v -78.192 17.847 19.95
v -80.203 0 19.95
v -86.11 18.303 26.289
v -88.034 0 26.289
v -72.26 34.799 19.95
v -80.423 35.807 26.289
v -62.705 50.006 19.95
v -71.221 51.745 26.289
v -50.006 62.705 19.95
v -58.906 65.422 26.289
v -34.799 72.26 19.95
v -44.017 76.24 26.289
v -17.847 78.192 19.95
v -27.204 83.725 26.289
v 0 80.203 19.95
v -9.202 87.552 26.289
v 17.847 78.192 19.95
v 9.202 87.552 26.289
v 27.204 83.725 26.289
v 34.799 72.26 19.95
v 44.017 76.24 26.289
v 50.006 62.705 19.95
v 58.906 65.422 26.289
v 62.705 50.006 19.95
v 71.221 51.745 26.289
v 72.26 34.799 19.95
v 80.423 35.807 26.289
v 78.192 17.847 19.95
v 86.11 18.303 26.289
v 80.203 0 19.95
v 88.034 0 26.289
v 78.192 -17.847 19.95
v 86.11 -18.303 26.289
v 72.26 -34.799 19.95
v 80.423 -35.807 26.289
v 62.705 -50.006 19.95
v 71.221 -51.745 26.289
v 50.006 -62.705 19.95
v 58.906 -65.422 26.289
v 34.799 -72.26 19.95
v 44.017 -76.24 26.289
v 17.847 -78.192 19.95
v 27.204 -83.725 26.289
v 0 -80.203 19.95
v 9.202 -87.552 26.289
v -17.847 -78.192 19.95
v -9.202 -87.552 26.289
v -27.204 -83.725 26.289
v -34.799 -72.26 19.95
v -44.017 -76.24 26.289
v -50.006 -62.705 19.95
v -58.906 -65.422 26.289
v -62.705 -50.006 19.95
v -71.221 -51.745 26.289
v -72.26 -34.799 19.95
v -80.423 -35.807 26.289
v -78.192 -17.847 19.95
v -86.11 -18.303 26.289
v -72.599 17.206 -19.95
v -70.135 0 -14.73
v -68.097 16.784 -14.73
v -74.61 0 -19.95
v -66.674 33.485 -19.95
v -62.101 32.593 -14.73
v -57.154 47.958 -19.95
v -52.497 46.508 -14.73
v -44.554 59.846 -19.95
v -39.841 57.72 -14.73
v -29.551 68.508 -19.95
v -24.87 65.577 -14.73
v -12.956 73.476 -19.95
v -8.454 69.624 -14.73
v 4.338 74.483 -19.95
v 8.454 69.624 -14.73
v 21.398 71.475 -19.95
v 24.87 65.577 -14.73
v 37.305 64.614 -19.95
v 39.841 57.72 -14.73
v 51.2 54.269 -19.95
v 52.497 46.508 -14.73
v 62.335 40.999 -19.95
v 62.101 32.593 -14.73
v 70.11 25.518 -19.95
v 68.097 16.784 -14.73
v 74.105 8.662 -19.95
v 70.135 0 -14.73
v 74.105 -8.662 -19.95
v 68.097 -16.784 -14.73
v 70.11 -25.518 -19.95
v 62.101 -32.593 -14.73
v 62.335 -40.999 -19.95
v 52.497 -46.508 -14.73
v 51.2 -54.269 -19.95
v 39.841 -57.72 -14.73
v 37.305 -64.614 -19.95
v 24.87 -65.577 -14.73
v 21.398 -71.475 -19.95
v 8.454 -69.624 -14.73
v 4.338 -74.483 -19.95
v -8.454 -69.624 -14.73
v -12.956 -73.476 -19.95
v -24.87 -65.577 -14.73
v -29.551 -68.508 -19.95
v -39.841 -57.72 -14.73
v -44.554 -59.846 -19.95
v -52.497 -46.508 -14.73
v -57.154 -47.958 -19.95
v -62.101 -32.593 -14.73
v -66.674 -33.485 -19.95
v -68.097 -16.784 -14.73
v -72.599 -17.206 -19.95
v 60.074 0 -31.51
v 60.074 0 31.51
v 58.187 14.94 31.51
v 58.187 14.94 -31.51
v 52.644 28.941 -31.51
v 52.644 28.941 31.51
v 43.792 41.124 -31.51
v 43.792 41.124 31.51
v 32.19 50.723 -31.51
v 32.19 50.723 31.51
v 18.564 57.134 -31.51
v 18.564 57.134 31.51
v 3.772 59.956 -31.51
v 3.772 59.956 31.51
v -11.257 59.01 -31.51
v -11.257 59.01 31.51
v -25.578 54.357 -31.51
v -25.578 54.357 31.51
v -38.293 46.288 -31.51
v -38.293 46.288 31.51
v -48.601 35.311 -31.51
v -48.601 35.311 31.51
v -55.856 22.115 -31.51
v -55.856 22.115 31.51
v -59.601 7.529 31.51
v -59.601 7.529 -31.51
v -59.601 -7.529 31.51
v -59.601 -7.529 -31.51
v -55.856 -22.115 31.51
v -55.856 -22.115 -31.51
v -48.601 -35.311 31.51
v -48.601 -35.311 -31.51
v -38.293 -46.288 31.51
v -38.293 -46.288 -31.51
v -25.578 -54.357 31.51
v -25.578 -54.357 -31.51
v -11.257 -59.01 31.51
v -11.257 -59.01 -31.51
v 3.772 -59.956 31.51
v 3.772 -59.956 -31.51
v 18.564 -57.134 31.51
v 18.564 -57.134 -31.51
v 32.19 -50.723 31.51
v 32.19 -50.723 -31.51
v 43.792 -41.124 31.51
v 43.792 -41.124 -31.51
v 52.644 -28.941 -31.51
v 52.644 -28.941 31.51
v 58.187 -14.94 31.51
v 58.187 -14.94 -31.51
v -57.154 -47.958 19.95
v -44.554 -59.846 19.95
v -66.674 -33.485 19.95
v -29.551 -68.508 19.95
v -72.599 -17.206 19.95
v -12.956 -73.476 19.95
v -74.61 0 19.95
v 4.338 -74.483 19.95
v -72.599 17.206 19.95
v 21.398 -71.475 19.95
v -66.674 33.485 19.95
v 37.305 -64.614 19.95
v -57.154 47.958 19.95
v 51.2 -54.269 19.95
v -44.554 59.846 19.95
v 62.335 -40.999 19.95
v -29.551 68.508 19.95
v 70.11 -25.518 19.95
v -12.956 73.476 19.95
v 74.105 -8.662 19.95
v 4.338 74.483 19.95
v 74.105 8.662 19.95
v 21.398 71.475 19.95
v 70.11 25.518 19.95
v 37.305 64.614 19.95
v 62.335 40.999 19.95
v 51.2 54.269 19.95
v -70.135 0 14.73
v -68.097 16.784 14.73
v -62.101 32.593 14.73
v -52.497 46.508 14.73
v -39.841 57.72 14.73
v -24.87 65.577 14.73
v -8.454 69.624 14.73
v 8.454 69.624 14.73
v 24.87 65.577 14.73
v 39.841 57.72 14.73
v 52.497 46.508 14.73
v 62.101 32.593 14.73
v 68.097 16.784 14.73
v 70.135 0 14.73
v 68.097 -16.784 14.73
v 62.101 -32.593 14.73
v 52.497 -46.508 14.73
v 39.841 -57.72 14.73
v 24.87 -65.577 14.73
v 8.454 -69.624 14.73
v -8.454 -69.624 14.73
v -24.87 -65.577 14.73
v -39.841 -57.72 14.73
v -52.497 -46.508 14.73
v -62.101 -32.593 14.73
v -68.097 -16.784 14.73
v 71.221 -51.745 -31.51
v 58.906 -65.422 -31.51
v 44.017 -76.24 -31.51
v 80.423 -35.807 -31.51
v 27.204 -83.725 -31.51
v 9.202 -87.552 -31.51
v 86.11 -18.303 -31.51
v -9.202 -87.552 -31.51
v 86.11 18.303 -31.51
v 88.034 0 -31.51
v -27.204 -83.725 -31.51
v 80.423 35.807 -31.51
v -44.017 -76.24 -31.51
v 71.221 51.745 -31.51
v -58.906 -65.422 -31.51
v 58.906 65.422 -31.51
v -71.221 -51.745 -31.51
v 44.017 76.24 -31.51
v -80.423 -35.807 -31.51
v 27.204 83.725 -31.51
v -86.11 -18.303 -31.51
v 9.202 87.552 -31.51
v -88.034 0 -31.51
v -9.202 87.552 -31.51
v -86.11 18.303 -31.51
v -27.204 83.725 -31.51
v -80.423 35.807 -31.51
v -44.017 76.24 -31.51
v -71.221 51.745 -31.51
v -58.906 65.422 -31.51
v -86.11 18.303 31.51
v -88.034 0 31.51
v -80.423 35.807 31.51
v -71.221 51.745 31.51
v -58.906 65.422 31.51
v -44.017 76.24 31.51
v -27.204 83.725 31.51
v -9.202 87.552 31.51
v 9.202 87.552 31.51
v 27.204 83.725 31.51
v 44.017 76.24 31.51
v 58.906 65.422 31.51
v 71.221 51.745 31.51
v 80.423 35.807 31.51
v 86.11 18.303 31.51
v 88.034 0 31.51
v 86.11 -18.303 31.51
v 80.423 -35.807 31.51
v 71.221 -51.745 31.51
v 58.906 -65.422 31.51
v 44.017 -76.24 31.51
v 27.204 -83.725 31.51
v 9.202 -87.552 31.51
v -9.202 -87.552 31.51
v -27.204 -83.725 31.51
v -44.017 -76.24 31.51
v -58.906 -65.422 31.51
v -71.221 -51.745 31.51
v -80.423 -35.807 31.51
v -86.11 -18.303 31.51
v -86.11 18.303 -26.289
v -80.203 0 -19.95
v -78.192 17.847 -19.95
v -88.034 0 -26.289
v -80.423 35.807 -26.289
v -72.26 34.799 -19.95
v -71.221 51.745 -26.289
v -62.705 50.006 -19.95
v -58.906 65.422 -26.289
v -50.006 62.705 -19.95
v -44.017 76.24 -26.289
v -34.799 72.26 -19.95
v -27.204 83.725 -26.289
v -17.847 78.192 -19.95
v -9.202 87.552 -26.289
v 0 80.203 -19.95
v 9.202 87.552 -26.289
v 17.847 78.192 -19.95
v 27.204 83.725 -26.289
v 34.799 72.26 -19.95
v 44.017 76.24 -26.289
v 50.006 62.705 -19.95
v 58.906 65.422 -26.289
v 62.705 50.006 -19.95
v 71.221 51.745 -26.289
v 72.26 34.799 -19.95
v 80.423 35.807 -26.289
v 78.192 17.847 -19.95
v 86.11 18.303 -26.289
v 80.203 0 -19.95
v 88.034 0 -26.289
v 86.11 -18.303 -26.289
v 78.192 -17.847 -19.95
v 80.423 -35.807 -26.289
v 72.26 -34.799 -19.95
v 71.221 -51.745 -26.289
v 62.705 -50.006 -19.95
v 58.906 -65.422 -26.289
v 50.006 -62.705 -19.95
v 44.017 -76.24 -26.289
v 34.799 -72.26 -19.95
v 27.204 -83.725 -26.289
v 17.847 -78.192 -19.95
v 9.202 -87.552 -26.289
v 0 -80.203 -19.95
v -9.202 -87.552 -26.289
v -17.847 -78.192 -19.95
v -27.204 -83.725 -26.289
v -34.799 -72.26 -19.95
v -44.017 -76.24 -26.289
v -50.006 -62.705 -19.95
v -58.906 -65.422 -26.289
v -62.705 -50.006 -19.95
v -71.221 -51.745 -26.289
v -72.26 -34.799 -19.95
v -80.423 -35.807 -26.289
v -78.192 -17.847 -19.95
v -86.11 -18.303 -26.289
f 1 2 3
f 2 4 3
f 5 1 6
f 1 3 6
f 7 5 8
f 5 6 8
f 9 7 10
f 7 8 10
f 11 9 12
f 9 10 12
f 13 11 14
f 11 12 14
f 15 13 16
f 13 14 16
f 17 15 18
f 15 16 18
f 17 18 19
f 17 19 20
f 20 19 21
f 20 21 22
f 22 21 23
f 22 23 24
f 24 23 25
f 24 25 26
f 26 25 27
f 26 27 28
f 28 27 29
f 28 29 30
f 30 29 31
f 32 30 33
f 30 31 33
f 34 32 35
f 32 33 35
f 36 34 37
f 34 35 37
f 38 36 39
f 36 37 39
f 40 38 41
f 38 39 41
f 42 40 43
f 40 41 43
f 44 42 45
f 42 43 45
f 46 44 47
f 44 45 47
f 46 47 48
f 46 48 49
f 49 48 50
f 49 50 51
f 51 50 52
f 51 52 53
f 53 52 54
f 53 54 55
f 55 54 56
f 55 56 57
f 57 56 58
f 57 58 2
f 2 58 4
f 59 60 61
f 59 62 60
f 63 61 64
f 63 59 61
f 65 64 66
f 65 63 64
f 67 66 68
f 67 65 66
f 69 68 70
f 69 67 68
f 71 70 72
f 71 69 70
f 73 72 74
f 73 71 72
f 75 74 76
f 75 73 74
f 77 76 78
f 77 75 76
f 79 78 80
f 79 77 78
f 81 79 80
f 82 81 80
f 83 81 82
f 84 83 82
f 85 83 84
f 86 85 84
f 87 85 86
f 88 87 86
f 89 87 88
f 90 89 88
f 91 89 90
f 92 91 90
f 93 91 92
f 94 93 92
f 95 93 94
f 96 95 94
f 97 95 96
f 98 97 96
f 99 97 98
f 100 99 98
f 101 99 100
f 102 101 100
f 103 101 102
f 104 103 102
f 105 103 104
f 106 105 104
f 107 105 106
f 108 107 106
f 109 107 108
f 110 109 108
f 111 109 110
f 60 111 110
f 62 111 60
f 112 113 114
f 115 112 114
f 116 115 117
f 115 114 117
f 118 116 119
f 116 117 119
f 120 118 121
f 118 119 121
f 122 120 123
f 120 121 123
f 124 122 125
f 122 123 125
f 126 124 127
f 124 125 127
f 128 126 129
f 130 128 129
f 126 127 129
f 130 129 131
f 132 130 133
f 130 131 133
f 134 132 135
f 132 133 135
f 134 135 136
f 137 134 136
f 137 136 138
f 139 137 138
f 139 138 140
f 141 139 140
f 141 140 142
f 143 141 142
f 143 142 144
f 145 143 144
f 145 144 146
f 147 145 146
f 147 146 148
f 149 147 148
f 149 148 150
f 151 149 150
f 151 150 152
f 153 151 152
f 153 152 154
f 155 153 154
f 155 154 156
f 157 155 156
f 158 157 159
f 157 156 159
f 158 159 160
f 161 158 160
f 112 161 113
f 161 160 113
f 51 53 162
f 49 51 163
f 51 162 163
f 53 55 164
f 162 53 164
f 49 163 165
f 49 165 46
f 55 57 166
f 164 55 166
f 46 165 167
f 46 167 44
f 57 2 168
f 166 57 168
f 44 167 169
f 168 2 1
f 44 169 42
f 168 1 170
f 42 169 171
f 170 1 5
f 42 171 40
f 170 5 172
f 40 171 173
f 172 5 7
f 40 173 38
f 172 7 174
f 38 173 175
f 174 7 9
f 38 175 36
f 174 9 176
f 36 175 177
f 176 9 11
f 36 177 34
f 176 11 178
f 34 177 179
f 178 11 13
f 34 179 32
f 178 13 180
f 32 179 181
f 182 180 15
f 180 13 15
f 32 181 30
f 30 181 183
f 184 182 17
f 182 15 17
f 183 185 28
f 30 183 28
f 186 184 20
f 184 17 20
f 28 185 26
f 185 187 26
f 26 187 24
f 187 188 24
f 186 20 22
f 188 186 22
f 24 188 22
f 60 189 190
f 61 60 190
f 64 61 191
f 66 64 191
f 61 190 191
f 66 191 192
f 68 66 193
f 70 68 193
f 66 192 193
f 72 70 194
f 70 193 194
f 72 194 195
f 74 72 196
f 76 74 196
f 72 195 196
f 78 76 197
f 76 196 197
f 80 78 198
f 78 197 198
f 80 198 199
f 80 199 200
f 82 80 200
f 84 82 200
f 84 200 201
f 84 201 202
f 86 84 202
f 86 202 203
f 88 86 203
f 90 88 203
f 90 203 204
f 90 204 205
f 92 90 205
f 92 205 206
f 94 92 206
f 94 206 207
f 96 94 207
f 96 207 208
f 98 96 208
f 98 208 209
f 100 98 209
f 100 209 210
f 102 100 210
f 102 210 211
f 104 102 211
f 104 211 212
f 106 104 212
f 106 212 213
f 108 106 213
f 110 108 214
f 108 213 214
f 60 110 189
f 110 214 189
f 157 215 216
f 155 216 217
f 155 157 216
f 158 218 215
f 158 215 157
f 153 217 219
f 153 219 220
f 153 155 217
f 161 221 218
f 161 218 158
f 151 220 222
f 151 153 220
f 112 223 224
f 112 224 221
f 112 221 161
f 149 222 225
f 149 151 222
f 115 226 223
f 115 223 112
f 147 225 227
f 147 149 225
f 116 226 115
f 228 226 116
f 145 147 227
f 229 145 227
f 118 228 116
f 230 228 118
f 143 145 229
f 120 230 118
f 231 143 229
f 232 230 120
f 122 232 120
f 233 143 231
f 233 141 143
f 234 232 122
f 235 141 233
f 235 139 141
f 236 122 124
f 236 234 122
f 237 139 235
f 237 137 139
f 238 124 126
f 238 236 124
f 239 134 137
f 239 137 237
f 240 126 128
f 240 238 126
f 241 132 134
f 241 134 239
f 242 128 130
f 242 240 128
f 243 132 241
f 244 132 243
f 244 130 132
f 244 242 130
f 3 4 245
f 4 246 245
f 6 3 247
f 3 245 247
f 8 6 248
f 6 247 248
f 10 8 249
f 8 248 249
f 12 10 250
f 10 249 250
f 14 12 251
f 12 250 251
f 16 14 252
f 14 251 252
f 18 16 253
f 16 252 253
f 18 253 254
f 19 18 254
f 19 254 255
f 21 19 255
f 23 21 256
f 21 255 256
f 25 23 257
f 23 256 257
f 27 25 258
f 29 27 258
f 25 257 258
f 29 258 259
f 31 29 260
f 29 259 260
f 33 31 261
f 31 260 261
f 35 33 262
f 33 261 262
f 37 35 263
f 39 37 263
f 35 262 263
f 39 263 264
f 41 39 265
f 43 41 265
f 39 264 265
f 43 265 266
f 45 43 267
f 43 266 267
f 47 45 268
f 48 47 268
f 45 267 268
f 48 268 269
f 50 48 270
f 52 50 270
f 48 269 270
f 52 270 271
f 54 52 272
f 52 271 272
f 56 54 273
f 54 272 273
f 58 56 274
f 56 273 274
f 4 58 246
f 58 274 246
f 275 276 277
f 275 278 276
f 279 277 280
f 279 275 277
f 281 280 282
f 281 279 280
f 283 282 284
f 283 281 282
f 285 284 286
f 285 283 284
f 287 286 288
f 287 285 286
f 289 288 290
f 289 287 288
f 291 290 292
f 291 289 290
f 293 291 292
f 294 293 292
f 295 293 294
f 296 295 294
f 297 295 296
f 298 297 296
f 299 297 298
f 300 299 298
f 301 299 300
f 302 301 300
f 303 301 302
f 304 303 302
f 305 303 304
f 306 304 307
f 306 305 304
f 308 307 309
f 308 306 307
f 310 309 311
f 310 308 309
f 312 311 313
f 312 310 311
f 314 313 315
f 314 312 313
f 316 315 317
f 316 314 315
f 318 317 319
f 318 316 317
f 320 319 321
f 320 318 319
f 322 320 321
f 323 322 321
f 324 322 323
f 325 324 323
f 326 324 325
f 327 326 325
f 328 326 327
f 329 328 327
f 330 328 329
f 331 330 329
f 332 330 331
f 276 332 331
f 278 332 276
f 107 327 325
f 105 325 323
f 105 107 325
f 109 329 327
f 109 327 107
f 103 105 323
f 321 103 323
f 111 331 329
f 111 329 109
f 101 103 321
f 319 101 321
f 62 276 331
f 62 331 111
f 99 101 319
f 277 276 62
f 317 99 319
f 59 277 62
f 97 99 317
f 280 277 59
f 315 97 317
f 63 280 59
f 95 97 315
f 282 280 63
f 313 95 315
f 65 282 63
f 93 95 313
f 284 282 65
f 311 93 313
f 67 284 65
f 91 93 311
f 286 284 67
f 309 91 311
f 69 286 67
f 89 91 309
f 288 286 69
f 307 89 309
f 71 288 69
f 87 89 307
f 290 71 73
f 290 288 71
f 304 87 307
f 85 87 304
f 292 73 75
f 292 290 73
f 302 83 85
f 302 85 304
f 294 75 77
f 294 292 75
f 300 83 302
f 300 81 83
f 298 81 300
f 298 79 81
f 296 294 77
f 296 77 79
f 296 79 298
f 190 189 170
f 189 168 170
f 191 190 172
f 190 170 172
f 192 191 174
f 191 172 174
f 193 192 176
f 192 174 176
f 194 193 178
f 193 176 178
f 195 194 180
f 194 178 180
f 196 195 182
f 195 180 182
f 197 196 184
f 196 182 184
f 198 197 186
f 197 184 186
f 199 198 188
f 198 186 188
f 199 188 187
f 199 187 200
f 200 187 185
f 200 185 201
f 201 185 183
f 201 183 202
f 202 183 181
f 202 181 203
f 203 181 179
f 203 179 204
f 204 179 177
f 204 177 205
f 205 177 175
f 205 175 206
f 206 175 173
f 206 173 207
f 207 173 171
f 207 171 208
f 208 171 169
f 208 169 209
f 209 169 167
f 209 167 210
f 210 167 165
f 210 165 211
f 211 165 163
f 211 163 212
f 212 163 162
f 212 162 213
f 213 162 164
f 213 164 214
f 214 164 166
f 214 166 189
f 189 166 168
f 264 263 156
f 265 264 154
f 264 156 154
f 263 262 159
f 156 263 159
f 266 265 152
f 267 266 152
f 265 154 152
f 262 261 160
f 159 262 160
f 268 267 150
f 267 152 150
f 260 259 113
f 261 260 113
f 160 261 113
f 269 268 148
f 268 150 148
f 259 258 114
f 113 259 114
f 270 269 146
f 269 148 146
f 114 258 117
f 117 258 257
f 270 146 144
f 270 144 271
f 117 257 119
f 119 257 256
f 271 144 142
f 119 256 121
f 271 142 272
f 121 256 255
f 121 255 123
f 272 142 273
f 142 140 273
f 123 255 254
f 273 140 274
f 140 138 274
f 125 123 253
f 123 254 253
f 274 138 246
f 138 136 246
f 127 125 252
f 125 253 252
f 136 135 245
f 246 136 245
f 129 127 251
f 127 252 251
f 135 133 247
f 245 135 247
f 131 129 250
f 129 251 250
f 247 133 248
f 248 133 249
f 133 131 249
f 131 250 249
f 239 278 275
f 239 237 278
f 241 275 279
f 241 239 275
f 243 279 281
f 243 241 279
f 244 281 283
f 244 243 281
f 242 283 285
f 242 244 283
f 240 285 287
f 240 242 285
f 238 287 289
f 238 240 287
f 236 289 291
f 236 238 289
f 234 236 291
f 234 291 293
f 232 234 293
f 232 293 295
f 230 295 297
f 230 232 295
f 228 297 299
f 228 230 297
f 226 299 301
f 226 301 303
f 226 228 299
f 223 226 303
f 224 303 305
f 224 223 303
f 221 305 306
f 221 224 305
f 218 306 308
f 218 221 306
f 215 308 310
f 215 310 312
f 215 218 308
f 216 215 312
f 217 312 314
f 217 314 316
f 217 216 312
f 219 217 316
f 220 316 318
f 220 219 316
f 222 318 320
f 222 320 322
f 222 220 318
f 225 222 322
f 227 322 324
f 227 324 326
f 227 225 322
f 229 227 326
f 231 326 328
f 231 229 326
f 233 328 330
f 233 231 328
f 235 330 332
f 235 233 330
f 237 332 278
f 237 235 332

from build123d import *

# Parameters (mm, degrees)
F3_R     = 60.074496
F4_DEPTH = 139


with BuildPart() as f1:
    # F0 (on Front) → F1 (revolve)
    with BuildSketch(Plane.XZ):
        Polygon((0, -31.509954), (0, 0), (-70.13493, 0), (-70.13493, -14.729742), (-74.609652, -19.950252), (-80.203056, -19.950252), (-88.033818, -26.289443), (-88.033818, -31.509954), align=None)
    revolve(axis=Axis((0, 0, -15.754977), (0, 0, -1)))

    # F2: F1 across face


with BuildPart() as f1_1:
    add(f1.part)
    add(f1.part.mirror(Plane.XY))

    # F3 (on face) → F4 (cut)
    with BuildSketch(Plane.XY.offset(31.509954)):
        Circle(F3_R)
    extrude(amount=-F4_DEPTH, mode=Mode.SUBTRACT)


solid = f1_1.part
